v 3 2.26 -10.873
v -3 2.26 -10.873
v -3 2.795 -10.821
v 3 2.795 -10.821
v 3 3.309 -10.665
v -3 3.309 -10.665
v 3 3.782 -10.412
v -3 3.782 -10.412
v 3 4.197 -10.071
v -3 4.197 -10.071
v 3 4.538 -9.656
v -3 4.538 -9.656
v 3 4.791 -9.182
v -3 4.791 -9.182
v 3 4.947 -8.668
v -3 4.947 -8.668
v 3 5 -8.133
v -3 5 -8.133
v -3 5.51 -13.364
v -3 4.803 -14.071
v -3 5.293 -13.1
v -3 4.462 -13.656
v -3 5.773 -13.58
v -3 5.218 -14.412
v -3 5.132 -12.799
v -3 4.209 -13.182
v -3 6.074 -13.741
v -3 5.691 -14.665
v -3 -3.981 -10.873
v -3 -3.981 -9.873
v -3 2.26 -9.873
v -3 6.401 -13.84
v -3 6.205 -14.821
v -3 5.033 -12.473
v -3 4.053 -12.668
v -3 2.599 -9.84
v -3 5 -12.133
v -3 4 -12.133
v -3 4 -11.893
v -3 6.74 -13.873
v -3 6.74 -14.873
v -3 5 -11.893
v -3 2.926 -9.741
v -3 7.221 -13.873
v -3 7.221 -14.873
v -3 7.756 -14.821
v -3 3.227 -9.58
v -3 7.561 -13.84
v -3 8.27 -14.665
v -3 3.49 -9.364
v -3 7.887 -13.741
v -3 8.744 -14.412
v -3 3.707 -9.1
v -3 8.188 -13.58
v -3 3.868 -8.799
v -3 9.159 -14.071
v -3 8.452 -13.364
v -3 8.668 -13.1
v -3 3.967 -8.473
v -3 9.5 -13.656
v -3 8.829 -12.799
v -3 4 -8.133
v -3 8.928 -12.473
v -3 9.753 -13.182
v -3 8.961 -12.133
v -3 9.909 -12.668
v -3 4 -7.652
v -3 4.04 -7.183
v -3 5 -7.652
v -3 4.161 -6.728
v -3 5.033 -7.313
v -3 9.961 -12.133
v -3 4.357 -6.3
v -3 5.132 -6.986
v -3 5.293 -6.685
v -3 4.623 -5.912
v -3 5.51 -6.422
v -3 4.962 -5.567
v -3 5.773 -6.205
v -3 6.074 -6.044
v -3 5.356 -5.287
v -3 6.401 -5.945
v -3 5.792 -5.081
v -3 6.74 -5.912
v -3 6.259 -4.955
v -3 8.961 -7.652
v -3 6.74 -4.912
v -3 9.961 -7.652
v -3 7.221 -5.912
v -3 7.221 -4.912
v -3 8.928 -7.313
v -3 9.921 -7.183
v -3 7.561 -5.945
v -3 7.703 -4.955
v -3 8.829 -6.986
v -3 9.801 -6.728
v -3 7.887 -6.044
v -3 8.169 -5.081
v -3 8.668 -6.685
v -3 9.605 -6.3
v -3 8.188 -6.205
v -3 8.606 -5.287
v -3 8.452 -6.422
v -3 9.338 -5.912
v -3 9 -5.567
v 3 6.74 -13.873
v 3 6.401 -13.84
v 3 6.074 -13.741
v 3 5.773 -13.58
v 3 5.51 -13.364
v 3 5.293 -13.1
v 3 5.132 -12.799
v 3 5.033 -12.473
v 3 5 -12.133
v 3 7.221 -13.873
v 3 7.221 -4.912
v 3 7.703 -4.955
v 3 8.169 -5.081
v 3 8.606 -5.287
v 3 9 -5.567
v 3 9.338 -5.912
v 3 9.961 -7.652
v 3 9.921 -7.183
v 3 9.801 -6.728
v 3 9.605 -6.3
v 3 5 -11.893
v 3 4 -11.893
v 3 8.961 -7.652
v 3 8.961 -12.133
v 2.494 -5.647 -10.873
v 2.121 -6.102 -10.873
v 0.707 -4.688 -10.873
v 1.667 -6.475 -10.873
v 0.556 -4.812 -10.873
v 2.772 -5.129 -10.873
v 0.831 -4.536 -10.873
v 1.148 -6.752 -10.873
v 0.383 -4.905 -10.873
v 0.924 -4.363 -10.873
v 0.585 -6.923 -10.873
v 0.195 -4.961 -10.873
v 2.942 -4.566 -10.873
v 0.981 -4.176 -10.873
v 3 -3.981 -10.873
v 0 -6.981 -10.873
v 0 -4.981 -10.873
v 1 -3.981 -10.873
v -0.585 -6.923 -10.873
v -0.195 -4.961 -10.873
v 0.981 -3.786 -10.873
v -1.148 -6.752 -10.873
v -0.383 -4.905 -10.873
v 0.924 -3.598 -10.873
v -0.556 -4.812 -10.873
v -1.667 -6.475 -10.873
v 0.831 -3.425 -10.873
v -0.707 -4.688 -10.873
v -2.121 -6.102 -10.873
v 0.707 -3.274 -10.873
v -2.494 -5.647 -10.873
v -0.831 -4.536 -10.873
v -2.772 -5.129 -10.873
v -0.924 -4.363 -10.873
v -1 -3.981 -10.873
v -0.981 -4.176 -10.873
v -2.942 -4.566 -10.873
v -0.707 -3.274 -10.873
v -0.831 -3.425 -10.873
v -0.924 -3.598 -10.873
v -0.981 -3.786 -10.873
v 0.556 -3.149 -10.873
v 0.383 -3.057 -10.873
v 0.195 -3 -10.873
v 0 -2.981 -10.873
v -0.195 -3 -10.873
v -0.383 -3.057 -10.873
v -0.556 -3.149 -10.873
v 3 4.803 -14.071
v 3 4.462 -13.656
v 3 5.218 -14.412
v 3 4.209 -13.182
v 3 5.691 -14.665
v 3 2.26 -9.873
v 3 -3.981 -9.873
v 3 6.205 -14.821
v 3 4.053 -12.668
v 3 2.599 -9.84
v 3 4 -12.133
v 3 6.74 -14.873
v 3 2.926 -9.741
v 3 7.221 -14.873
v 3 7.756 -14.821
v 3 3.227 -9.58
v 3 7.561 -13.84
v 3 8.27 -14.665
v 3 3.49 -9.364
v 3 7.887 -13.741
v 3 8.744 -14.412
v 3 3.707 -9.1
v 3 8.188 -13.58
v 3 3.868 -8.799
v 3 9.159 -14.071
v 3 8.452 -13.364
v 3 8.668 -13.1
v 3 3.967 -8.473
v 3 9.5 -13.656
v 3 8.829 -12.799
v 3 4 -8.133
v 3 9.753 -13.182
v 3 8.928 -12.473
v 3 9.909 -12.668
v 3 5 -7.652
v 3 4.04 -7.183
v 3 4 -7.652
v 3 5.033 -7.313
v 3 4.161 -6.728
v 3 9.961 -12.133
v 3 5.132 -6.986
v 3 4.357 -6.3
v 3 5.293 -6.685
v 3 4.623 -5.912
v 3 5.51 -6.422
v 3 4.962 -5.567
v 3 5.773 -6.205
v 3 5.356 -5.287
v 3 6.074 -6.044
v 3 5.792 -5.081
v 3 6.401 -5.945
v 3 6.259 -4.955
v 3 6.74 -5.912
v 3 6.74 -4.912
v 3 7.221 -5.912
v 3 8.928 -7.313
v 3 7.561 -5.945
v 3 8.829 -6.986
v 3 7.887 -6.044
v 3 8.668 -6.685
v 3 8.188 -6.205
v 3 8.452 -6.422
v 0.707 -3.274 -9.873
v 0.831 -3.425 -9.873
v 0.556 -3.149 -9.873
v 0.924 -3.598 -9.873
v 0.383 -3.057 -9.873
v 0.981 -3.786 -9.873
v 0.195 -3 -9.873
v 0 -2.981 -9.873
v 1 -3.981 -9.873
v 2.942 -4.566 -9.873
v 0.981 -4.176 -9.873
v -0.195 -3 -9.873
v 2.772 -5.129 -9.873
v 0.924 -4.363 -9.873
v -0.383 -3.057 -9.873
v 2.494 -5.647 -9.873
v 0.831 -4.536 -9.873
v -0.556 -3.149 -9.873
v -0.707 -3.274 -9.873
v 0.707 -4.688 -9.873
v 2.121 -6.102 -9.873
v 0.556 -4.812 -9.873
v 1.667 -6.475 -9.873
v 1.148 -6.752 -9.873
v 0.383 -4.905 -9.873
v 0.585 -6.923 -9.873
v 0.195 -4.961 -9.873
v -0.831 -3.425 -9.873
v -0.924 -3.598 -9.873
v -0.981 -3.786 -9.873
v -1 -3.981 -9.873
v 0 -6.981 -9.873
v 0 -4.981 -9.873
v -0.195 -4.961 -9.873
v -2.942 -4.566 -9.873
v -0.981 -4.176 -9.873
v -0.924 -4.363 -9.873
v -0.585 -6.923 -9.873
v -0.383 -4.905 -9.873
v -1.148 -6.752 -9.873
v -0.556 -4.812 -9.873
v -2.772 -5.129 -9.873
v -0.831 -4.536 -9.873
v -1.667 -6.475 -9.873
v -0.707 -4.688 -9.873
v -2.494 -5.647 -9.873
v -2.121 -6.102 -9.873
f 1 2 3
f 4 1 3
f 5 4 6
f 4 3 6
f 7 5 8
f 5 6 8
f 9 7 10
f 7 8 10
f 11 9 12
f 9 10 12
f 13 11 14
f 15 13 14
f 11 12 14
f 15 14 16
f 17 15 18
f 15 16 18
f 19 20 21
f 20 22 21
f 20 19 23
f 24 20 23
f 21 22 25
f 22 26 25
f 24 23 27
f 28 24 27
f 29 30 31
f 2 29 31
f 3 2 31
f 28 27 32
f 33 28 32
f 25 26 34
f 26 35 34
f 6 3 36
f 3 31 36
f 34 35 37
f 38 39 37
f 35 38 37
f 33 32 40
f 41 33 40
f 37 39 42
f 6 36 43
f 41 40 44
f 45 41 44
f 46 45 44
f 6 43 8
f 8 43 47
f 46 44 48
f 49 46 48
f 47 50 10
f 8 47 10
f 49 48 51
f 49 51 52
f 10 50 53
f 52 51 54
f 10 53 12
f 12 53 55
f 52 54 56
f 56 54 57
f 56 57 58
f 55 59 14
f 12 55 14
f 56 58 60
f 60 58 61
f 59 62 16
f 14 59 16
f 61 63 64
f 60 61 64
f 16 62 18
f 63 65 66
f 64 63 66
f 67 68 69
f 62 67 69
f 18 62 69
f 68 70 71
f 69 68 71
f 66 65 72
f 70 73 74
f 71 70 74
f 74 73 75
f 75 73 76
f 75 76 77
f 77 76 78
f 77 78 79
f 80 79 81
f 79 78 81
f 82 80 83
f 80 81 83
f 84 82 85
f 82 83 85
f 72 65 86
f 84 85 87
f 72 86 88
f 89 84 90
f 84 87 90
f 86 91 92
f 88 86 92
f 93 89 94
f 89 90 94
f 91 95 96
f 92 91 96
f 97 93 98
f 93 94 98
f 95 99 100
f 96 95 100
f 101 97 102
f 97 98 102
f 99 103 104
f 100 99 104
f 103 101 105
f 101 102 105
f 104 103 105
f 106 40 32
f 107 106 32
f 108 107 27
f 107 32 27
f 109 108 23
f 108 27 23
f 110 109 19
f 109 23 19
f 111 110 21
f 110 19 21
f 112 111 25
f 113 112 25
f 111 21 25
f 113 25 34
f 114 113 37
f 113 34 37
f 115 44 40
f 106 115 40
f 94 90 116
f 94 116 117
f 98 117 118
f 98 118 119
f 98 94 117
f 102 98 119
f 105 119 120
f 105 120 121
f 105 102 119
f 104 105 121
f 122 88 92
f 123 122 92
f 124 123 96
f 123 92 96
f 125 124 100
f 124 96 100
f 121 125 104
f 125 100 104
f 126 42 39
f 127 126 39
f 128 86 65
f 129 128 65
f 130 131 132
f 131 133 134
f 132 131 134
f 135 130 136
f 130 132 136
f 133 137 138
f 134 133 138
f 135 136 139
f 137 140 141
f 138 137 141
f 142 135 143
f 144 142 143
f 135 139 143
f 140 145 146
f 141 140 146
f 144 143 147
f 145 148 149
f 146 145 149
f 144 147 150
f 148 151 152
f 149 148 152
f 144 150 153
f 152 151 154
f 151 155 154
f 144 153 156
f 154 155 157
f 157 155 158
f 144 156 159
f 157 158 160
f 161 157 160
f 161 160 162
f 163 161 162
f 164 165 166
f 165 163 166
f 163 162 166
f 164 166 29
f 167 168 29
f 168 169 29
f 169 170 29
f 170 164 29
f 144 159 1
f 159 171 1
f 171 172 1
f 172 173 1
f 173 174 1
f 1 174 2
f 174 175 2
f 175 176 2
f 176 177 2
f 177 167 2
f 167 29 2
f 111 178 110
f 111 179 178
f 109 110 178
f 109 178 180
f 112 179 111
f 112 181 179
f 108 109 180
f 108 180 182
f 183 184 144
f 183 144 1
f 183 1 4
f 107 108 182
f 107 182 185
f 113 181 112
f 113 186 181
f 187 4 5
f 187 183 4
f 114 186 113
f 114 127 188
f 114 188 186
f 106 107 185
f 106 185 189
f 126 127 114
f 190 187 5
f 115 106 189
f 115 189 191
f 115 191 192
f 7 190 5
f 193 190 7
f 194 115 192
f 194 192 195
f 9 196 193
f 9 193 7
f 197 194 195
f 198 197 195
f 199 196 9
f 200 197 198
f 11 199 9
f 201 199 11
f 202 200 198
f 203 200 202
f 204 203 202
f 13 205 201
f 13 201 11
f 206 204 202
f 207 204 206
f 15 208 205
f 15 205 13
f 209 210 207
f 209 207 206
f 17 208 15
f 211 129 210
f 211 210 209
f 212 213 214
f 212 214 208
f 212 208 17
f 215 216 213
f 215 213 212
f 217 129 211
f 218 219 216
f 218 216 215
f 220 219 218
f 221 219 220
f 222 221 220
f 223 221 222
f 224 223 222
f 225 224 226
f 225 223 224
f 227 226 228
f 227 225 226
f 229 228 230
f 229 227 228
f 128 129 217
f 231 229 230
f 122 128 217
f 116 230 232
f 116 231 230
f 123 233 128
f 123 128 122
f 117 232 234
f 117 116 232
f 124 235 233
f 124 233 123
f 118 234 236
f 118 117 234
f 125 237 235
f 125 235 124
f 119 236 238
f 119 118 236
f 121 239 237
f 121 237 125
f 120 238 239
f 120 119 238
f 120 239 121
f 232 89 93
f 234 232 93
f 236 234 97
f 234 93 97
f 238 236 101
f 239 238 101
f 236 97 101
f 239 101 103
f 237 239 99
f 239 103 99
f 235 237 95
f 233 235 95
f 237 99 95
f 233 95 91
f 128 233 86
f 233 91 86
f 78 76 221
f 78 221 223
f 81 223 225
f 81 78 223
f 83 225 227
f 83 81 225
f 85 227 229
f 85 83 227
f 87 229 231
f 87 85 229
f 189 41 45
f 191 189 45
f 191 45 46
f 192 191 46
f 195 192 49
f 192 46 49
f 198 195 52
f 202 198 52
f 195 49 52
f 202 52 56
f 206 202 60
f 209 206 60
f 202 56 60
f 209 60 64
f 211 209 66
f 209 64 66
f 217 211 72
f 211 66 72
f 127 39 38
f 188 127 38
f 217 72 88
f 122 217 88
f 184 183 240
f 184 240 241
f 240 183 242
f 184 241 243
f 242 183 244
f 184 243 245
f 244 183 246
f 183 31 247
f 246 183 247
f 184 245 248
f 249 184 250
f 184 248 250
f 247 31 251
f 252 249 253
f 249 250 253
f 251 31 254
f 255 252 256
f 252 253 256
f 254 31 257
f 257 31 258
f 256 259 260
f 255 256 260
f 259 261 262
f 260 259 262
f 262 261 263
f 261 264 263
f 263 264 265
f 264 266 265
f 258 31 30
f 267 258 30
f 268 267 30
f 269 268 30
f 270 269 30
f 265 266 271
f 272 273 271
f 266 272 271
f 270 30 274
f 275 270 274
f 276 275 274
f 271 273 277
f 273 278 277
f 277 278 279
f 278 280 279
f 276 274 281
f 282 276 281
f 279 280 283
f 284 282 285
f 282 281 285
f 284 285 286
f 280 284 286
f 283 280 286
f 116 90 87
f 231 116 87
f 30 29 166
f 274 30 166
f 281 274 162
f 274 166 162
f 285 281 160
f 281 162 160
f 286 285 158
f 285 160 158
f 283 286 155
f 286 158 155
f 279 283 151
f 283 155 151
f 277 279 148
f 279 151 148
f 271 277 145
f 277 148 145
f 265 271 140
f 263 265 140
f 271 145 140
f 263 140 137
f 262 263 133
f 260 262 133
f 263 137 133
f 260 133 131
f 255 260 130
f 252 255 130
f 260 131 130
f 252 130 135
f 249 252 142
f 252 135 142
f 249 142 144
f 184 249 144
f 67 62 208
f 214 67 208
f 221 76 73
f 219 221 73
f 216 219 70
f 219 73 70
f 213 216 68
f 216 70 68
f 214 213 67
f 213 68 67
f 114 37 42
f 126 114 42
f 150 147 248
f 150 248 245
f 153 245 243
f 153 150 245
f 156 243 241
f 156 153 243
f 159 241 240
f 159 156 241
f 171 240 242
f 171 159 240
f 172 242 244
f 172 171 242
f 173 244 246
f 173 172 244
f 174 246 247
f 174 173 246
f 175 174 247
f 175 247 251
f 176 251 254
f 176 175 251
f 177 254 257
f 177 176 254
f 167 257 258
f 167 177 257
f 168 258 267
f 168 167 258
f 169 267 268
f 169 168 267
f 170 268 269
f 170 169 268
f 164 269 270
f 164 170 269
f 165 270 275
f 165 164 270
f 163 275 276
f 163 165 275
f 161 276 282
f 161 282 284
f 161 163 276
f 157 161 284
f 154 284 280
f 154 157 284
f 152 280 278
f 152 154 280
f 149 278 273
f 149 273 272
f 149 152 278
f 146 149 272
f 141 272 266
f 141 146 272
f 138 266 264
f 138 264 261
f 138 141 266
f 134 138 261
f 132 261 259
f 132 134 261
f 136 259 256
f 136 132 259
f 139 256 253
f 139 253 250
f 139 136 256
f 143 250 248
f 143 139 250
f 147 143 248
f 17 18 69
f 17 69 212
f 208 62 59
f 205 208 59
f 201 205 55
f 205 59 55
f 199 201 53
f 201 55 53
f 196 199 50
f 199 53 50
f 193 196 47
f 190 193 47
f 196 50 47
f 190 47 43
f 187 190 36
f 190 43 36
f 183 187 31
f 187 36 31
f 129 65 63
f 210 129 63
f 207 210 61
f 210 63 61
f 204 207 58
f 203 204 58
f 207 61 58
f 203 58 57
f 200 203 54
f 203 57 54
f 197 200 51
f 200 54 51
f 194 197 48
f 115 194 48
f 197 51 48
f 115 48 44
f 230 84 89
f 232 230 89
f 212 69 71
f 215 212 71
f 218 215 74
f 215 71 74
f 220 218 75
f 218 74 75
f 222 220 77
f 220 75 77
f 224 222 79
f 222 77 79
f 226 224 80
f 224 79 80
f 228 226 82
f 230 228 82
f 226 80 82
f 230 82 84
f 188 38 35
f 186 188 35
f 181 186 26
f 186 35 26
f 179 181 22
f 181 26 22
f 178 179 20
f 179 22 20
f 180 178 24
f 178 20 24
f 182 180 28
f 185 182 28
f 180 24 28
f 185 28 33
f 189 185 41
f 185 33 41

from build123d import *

# Parameters (mm, degrees)
EXTRUDE_1_DEPTH     = 1
SKETCH_2_R          = 1
CUT_EXTRUDE_1_DEPTH = 28.116287625
OTHER_START         = -3
OTHER_1_DEPTH       = 6
OTHER_1_2_DEPTH     = 6
OTHER_2_DEPTH       = 6
OTHER_2_2_DEPTH     = 6
OTHER_START_2       = -5.911973487
OTHER_2_3_OUTLINE_W = 6
OTHER_2_3_OUTLINE_H = 4
OTHER_2_3_DEPTH     = 12.911973487
OTHER_START_3       = -10.873389715
OTHER_2_4_OUTLINE_R = 1
OTHER_2_4_DEPTH     = 1
OTHER_START_4       = -8.133389715
OTHER_2_5_OUTLINE_W = 6
OTHER_2_5_OUTLINE_H = 1
OTHER_2_5_DEPTH     = 0.481416228
OTHER_2_6_DEPTH     = 6
OTHER_2_7_DEPTH     = 6


with BuildPart() as part:
    # Sketch 1 → Бобышка-Вытянуть1 (new body)
    with BuildSketch(Plane(origin=(0, 0, 0), x_dir=(1, 0, 0), z_dir=(0, 1, 0))):
        with BuildLine():
            Line((-3, 26.931265373), (-3, -3.068734627))
            ThreePointArc((-3, -3.068734627), (0, -6.068734627), (3, -3.068734627))
            Line((3, -3.068734627), (3, 26.931265373))
            Line((3, 26.931265373), (-3, 26.931265373))
        make_face()
    extrude(amount=EXTRUDE_1_DEPTH)

    # Sketch 2 → Вырез-Вытянуть1 (cut, through all)
    with BuildSketch(Plane(origin=(0, 1, 0), x_dir=(1, 0, 0), z_dir=(0, 1, 0))):
        with Locations(Location((0, -3.068734627, 0), (0, 0, 270))):
            Circle(SKETCH_2_R)
    extrude(amount=-CUT_EXTRUDE_1_DEPTH, mode=Mode.SUBTRACT)

    # Other 1: read off the stored shape, not the designer's step
    # Other 1 outline → Other 1 (cut)
    with BuildSketch(Plane.YZ.offset(OTHER_START)):
        with BuildLine():
            Line((1, -26.931265373), (1, -5.288574535))
            ThreePointArc((1, -5.288574535), (0.26258199, -4.342443478), (0, -3.171973487))
            Line((0, -3.171973487), (0, -26.931265373))
            Line((0, -26.931265373), (1, -26.931265373))
        make_face()
    extrude(amount=OTHER_1_DEPTH, mode=Mode.SUBTRACT)

    # Other 1 2 outline → Other 1 2 (add)
    with BuildSketch(Plane.YZ.offset(OTHER_START)):
        with BuildLine():
            Line((2.74, -5.911973487), (22.980708114, -5.911973487))
            Line((22.980708114, -5.911973487), (22.980708114, -4.911973487))
            Line((22.980708114, -4.911973487), (2.74, -4.911973487))
            ThreePointArc((2.74, -4.911973487), (1.509634201, -4.402339286), (1, -3.171973487))
            Line((1, -3.171973487), (1, -5.288574535))
            ThreePointArc((1, -5.288574535), (1.815848193, -5.75141983), (2.74, -5.911973487))
        make_face()
    extrude(amount=OTHER_1_2_DEPTH)

    # Other 2: read off the stored shape, not the designer's step
    # Other 2 outline → Other 2 (cut)
    with BuildSketch(Plane.YZ.offset(OTHER_START)):
        with BuildLine():
            ThreePointArc((7.221416228, -4.911973487), (8.391886219, -5.174555476), (9.338017277, -5.911973487))
            Line((9.338017277, -5.911973487), (22.980708114, -5.911973487))
            Line((22.980708114, -5.911973487), (22.980708114, -4.911973487))
            Line((22.980708114, -4.911973487), (7.221416228, -4.911973487))
        make_face()
    extrude(amount=OTHER_2_DEPTH, mode=Mode.SUBTRACT)

    # Other 2 2 outline → Other 2 2 (add)
    with BuildSketch(Plane.YZ.offset(OTHER_START)):
        with BuildLine():
            Line((8.961416228, -7.651973487), (8.961416228, -12.133389715))
            ThreePointArc((8.961416228, -12.133389715), (8.451782027, -13.363755514), (7.221416228, -13.873389715))
            Line((7.221416228, -13.873389715), (6.74, -13.873389715))
            ThreePointArc((6.74, -13.873389715), (5.509634201, -13.363755514), (5, -12.133389715))
            Line((5, -12.133389715), (5, -11.892681601))
            Line((5, -11.892681601), (4, -11.892681601))
            Line((4, -11.892681601), (4, -12.133389715))
            ThreePointArc((4, -12.133389715), (4.80252742, -14.070862295), (6.74, -14.873389715))
            Line((6.74, -14.873389715), (7.221416228, -14.873389715))
            ThreePointArc((7.221416228, -14.873389715), (9.158888808, -14.070862295), (9.961416228, -12.133389715))
            Line((9.961416228, -12.133389715), (9.961416228, -7.651973487))
            ThreePointArc((9.961416228, -7.651973487), (9.800862571, -6.72782168), (9.338017277, -5.911973487))
            Line((9.338017277, -5.911973487), (7.221416228, -5.911973487))
            ThreePointArc((7.221416228, -5.911973487), (8.451782028, -6.421607687), (8.961416228, -7.651973487))
        make_face()
    extrude(amount=OTHER_2_2_DEPTH)

    # Other 2 3 outline → Other 2 3 (cut)
    with BuildSketch(Plane.XY.offset(OTHER_START_2)):
        with Locations((0, 2)):
            Rectangle(OTHER_2_3_OUTLINE_W, OTHER_2_3_OUTLINE_H)
    extrude(amount=OTHER_2_3_DEPTH, mode=Mode.SUBTRACT)

    # Other 2 6 outline → Other 2 6 (cut)
    with BuildSketch(Plane.YZ.offset(OTHER_START)):
        with BuildLine():
            ThreePointArc((4.623398951, -5.911973487), (5.569530009, -5.174555476), (6.74, -4.911973487))
            Line((6.74, -4.911973487), (4, -4.911973487))
            Line((4, -4.911973487), (4, -5.911973487))
            Line((4, -5.911973487), (4.623398951, -5.911973487))
        make_face()
    extrude(amount=OTHER_2_6_DEPTH, mode=Mode.SUBTRACT)



with BuildPart() as body_2:
    # Other 2 4 outline → Other 2 4 (new body)
    with BuildSketch(Plane.XY.offset(OTHER_START_3)):
        with BuildLine():
            Line((3, 1), (-3, 1))
            Line((-3, 1), (-3, -3.980708114))
            ThreePointArc((-3, -3.980708114), (0, -6.980708114), (3, -3.980708114))
            Line((3, -3.980708114), (3, 1))
        make_face()
        with Locations((0, -3.980708114)):
            Circle(OTHER_2_4_OUTLINE_R, mode=Mode.SUBTRACT)
    extrude(amount=OTHER_2_4_DEPTH)


with BuildPart() as body_3:
    # Other 2 5 outline → Other 2 5 (new body)
    with BuildSketch(Plane.XY.offset(OTHER_START_4)):
        with Locations((0, 4.5)):
            Rectangle(OTHER_2_5_OUTLINE_W, OTHER_2_5_OUTLINE_H)
    extrude(amount=OTHER_2_5_DEPTH)


with BuildPart() as part_1:
    add(part.part)

    add(body_2.part)  # Other 2 7 merges body 2

    add(body_3.part)  # Other 2 7 merges body 3
    # Other 2 7 outline → Other 2 7 (add)
    with BuildSketch(Plane.YZ.offset(OTHER_START)):
        with BuildLine():
            Line((6.74, -5.911973487), (4.623398951, -5.911973487))
            ThreePointArc((4.623398951, -5.911973487), (4.160553657, -6.72782168), (4, -7.651973487))
            Line((4, -7.651973487), (5, -7.651973487))
            ThreePointArc((5, -7.651973487), (5.5096342, -6.421607687), (6.74, -5.911973487))
        make_face()
        with BuildLine():
            Line((1, -10.873389715), (2.26, -10.873389715))
            ThreePointArc((2.26, -10.873389715), (4.19747258, -10.070862295), (5, -8.133389715))
            Line((5, -8.133389715), (4, -8.133389715))
            ThreePointArc((4, -8.133389715), (3.490365799, -9.363755514), (2.26, -9.873389715))
            Line((2.26, -9.873389715), (1, -9.873389715))
            Line((1, -9.873389715), (1, -10.873389715))
        make_face()
    extrude(amount=OTHER_2_7_DEPTH)


solid = part_1.part
